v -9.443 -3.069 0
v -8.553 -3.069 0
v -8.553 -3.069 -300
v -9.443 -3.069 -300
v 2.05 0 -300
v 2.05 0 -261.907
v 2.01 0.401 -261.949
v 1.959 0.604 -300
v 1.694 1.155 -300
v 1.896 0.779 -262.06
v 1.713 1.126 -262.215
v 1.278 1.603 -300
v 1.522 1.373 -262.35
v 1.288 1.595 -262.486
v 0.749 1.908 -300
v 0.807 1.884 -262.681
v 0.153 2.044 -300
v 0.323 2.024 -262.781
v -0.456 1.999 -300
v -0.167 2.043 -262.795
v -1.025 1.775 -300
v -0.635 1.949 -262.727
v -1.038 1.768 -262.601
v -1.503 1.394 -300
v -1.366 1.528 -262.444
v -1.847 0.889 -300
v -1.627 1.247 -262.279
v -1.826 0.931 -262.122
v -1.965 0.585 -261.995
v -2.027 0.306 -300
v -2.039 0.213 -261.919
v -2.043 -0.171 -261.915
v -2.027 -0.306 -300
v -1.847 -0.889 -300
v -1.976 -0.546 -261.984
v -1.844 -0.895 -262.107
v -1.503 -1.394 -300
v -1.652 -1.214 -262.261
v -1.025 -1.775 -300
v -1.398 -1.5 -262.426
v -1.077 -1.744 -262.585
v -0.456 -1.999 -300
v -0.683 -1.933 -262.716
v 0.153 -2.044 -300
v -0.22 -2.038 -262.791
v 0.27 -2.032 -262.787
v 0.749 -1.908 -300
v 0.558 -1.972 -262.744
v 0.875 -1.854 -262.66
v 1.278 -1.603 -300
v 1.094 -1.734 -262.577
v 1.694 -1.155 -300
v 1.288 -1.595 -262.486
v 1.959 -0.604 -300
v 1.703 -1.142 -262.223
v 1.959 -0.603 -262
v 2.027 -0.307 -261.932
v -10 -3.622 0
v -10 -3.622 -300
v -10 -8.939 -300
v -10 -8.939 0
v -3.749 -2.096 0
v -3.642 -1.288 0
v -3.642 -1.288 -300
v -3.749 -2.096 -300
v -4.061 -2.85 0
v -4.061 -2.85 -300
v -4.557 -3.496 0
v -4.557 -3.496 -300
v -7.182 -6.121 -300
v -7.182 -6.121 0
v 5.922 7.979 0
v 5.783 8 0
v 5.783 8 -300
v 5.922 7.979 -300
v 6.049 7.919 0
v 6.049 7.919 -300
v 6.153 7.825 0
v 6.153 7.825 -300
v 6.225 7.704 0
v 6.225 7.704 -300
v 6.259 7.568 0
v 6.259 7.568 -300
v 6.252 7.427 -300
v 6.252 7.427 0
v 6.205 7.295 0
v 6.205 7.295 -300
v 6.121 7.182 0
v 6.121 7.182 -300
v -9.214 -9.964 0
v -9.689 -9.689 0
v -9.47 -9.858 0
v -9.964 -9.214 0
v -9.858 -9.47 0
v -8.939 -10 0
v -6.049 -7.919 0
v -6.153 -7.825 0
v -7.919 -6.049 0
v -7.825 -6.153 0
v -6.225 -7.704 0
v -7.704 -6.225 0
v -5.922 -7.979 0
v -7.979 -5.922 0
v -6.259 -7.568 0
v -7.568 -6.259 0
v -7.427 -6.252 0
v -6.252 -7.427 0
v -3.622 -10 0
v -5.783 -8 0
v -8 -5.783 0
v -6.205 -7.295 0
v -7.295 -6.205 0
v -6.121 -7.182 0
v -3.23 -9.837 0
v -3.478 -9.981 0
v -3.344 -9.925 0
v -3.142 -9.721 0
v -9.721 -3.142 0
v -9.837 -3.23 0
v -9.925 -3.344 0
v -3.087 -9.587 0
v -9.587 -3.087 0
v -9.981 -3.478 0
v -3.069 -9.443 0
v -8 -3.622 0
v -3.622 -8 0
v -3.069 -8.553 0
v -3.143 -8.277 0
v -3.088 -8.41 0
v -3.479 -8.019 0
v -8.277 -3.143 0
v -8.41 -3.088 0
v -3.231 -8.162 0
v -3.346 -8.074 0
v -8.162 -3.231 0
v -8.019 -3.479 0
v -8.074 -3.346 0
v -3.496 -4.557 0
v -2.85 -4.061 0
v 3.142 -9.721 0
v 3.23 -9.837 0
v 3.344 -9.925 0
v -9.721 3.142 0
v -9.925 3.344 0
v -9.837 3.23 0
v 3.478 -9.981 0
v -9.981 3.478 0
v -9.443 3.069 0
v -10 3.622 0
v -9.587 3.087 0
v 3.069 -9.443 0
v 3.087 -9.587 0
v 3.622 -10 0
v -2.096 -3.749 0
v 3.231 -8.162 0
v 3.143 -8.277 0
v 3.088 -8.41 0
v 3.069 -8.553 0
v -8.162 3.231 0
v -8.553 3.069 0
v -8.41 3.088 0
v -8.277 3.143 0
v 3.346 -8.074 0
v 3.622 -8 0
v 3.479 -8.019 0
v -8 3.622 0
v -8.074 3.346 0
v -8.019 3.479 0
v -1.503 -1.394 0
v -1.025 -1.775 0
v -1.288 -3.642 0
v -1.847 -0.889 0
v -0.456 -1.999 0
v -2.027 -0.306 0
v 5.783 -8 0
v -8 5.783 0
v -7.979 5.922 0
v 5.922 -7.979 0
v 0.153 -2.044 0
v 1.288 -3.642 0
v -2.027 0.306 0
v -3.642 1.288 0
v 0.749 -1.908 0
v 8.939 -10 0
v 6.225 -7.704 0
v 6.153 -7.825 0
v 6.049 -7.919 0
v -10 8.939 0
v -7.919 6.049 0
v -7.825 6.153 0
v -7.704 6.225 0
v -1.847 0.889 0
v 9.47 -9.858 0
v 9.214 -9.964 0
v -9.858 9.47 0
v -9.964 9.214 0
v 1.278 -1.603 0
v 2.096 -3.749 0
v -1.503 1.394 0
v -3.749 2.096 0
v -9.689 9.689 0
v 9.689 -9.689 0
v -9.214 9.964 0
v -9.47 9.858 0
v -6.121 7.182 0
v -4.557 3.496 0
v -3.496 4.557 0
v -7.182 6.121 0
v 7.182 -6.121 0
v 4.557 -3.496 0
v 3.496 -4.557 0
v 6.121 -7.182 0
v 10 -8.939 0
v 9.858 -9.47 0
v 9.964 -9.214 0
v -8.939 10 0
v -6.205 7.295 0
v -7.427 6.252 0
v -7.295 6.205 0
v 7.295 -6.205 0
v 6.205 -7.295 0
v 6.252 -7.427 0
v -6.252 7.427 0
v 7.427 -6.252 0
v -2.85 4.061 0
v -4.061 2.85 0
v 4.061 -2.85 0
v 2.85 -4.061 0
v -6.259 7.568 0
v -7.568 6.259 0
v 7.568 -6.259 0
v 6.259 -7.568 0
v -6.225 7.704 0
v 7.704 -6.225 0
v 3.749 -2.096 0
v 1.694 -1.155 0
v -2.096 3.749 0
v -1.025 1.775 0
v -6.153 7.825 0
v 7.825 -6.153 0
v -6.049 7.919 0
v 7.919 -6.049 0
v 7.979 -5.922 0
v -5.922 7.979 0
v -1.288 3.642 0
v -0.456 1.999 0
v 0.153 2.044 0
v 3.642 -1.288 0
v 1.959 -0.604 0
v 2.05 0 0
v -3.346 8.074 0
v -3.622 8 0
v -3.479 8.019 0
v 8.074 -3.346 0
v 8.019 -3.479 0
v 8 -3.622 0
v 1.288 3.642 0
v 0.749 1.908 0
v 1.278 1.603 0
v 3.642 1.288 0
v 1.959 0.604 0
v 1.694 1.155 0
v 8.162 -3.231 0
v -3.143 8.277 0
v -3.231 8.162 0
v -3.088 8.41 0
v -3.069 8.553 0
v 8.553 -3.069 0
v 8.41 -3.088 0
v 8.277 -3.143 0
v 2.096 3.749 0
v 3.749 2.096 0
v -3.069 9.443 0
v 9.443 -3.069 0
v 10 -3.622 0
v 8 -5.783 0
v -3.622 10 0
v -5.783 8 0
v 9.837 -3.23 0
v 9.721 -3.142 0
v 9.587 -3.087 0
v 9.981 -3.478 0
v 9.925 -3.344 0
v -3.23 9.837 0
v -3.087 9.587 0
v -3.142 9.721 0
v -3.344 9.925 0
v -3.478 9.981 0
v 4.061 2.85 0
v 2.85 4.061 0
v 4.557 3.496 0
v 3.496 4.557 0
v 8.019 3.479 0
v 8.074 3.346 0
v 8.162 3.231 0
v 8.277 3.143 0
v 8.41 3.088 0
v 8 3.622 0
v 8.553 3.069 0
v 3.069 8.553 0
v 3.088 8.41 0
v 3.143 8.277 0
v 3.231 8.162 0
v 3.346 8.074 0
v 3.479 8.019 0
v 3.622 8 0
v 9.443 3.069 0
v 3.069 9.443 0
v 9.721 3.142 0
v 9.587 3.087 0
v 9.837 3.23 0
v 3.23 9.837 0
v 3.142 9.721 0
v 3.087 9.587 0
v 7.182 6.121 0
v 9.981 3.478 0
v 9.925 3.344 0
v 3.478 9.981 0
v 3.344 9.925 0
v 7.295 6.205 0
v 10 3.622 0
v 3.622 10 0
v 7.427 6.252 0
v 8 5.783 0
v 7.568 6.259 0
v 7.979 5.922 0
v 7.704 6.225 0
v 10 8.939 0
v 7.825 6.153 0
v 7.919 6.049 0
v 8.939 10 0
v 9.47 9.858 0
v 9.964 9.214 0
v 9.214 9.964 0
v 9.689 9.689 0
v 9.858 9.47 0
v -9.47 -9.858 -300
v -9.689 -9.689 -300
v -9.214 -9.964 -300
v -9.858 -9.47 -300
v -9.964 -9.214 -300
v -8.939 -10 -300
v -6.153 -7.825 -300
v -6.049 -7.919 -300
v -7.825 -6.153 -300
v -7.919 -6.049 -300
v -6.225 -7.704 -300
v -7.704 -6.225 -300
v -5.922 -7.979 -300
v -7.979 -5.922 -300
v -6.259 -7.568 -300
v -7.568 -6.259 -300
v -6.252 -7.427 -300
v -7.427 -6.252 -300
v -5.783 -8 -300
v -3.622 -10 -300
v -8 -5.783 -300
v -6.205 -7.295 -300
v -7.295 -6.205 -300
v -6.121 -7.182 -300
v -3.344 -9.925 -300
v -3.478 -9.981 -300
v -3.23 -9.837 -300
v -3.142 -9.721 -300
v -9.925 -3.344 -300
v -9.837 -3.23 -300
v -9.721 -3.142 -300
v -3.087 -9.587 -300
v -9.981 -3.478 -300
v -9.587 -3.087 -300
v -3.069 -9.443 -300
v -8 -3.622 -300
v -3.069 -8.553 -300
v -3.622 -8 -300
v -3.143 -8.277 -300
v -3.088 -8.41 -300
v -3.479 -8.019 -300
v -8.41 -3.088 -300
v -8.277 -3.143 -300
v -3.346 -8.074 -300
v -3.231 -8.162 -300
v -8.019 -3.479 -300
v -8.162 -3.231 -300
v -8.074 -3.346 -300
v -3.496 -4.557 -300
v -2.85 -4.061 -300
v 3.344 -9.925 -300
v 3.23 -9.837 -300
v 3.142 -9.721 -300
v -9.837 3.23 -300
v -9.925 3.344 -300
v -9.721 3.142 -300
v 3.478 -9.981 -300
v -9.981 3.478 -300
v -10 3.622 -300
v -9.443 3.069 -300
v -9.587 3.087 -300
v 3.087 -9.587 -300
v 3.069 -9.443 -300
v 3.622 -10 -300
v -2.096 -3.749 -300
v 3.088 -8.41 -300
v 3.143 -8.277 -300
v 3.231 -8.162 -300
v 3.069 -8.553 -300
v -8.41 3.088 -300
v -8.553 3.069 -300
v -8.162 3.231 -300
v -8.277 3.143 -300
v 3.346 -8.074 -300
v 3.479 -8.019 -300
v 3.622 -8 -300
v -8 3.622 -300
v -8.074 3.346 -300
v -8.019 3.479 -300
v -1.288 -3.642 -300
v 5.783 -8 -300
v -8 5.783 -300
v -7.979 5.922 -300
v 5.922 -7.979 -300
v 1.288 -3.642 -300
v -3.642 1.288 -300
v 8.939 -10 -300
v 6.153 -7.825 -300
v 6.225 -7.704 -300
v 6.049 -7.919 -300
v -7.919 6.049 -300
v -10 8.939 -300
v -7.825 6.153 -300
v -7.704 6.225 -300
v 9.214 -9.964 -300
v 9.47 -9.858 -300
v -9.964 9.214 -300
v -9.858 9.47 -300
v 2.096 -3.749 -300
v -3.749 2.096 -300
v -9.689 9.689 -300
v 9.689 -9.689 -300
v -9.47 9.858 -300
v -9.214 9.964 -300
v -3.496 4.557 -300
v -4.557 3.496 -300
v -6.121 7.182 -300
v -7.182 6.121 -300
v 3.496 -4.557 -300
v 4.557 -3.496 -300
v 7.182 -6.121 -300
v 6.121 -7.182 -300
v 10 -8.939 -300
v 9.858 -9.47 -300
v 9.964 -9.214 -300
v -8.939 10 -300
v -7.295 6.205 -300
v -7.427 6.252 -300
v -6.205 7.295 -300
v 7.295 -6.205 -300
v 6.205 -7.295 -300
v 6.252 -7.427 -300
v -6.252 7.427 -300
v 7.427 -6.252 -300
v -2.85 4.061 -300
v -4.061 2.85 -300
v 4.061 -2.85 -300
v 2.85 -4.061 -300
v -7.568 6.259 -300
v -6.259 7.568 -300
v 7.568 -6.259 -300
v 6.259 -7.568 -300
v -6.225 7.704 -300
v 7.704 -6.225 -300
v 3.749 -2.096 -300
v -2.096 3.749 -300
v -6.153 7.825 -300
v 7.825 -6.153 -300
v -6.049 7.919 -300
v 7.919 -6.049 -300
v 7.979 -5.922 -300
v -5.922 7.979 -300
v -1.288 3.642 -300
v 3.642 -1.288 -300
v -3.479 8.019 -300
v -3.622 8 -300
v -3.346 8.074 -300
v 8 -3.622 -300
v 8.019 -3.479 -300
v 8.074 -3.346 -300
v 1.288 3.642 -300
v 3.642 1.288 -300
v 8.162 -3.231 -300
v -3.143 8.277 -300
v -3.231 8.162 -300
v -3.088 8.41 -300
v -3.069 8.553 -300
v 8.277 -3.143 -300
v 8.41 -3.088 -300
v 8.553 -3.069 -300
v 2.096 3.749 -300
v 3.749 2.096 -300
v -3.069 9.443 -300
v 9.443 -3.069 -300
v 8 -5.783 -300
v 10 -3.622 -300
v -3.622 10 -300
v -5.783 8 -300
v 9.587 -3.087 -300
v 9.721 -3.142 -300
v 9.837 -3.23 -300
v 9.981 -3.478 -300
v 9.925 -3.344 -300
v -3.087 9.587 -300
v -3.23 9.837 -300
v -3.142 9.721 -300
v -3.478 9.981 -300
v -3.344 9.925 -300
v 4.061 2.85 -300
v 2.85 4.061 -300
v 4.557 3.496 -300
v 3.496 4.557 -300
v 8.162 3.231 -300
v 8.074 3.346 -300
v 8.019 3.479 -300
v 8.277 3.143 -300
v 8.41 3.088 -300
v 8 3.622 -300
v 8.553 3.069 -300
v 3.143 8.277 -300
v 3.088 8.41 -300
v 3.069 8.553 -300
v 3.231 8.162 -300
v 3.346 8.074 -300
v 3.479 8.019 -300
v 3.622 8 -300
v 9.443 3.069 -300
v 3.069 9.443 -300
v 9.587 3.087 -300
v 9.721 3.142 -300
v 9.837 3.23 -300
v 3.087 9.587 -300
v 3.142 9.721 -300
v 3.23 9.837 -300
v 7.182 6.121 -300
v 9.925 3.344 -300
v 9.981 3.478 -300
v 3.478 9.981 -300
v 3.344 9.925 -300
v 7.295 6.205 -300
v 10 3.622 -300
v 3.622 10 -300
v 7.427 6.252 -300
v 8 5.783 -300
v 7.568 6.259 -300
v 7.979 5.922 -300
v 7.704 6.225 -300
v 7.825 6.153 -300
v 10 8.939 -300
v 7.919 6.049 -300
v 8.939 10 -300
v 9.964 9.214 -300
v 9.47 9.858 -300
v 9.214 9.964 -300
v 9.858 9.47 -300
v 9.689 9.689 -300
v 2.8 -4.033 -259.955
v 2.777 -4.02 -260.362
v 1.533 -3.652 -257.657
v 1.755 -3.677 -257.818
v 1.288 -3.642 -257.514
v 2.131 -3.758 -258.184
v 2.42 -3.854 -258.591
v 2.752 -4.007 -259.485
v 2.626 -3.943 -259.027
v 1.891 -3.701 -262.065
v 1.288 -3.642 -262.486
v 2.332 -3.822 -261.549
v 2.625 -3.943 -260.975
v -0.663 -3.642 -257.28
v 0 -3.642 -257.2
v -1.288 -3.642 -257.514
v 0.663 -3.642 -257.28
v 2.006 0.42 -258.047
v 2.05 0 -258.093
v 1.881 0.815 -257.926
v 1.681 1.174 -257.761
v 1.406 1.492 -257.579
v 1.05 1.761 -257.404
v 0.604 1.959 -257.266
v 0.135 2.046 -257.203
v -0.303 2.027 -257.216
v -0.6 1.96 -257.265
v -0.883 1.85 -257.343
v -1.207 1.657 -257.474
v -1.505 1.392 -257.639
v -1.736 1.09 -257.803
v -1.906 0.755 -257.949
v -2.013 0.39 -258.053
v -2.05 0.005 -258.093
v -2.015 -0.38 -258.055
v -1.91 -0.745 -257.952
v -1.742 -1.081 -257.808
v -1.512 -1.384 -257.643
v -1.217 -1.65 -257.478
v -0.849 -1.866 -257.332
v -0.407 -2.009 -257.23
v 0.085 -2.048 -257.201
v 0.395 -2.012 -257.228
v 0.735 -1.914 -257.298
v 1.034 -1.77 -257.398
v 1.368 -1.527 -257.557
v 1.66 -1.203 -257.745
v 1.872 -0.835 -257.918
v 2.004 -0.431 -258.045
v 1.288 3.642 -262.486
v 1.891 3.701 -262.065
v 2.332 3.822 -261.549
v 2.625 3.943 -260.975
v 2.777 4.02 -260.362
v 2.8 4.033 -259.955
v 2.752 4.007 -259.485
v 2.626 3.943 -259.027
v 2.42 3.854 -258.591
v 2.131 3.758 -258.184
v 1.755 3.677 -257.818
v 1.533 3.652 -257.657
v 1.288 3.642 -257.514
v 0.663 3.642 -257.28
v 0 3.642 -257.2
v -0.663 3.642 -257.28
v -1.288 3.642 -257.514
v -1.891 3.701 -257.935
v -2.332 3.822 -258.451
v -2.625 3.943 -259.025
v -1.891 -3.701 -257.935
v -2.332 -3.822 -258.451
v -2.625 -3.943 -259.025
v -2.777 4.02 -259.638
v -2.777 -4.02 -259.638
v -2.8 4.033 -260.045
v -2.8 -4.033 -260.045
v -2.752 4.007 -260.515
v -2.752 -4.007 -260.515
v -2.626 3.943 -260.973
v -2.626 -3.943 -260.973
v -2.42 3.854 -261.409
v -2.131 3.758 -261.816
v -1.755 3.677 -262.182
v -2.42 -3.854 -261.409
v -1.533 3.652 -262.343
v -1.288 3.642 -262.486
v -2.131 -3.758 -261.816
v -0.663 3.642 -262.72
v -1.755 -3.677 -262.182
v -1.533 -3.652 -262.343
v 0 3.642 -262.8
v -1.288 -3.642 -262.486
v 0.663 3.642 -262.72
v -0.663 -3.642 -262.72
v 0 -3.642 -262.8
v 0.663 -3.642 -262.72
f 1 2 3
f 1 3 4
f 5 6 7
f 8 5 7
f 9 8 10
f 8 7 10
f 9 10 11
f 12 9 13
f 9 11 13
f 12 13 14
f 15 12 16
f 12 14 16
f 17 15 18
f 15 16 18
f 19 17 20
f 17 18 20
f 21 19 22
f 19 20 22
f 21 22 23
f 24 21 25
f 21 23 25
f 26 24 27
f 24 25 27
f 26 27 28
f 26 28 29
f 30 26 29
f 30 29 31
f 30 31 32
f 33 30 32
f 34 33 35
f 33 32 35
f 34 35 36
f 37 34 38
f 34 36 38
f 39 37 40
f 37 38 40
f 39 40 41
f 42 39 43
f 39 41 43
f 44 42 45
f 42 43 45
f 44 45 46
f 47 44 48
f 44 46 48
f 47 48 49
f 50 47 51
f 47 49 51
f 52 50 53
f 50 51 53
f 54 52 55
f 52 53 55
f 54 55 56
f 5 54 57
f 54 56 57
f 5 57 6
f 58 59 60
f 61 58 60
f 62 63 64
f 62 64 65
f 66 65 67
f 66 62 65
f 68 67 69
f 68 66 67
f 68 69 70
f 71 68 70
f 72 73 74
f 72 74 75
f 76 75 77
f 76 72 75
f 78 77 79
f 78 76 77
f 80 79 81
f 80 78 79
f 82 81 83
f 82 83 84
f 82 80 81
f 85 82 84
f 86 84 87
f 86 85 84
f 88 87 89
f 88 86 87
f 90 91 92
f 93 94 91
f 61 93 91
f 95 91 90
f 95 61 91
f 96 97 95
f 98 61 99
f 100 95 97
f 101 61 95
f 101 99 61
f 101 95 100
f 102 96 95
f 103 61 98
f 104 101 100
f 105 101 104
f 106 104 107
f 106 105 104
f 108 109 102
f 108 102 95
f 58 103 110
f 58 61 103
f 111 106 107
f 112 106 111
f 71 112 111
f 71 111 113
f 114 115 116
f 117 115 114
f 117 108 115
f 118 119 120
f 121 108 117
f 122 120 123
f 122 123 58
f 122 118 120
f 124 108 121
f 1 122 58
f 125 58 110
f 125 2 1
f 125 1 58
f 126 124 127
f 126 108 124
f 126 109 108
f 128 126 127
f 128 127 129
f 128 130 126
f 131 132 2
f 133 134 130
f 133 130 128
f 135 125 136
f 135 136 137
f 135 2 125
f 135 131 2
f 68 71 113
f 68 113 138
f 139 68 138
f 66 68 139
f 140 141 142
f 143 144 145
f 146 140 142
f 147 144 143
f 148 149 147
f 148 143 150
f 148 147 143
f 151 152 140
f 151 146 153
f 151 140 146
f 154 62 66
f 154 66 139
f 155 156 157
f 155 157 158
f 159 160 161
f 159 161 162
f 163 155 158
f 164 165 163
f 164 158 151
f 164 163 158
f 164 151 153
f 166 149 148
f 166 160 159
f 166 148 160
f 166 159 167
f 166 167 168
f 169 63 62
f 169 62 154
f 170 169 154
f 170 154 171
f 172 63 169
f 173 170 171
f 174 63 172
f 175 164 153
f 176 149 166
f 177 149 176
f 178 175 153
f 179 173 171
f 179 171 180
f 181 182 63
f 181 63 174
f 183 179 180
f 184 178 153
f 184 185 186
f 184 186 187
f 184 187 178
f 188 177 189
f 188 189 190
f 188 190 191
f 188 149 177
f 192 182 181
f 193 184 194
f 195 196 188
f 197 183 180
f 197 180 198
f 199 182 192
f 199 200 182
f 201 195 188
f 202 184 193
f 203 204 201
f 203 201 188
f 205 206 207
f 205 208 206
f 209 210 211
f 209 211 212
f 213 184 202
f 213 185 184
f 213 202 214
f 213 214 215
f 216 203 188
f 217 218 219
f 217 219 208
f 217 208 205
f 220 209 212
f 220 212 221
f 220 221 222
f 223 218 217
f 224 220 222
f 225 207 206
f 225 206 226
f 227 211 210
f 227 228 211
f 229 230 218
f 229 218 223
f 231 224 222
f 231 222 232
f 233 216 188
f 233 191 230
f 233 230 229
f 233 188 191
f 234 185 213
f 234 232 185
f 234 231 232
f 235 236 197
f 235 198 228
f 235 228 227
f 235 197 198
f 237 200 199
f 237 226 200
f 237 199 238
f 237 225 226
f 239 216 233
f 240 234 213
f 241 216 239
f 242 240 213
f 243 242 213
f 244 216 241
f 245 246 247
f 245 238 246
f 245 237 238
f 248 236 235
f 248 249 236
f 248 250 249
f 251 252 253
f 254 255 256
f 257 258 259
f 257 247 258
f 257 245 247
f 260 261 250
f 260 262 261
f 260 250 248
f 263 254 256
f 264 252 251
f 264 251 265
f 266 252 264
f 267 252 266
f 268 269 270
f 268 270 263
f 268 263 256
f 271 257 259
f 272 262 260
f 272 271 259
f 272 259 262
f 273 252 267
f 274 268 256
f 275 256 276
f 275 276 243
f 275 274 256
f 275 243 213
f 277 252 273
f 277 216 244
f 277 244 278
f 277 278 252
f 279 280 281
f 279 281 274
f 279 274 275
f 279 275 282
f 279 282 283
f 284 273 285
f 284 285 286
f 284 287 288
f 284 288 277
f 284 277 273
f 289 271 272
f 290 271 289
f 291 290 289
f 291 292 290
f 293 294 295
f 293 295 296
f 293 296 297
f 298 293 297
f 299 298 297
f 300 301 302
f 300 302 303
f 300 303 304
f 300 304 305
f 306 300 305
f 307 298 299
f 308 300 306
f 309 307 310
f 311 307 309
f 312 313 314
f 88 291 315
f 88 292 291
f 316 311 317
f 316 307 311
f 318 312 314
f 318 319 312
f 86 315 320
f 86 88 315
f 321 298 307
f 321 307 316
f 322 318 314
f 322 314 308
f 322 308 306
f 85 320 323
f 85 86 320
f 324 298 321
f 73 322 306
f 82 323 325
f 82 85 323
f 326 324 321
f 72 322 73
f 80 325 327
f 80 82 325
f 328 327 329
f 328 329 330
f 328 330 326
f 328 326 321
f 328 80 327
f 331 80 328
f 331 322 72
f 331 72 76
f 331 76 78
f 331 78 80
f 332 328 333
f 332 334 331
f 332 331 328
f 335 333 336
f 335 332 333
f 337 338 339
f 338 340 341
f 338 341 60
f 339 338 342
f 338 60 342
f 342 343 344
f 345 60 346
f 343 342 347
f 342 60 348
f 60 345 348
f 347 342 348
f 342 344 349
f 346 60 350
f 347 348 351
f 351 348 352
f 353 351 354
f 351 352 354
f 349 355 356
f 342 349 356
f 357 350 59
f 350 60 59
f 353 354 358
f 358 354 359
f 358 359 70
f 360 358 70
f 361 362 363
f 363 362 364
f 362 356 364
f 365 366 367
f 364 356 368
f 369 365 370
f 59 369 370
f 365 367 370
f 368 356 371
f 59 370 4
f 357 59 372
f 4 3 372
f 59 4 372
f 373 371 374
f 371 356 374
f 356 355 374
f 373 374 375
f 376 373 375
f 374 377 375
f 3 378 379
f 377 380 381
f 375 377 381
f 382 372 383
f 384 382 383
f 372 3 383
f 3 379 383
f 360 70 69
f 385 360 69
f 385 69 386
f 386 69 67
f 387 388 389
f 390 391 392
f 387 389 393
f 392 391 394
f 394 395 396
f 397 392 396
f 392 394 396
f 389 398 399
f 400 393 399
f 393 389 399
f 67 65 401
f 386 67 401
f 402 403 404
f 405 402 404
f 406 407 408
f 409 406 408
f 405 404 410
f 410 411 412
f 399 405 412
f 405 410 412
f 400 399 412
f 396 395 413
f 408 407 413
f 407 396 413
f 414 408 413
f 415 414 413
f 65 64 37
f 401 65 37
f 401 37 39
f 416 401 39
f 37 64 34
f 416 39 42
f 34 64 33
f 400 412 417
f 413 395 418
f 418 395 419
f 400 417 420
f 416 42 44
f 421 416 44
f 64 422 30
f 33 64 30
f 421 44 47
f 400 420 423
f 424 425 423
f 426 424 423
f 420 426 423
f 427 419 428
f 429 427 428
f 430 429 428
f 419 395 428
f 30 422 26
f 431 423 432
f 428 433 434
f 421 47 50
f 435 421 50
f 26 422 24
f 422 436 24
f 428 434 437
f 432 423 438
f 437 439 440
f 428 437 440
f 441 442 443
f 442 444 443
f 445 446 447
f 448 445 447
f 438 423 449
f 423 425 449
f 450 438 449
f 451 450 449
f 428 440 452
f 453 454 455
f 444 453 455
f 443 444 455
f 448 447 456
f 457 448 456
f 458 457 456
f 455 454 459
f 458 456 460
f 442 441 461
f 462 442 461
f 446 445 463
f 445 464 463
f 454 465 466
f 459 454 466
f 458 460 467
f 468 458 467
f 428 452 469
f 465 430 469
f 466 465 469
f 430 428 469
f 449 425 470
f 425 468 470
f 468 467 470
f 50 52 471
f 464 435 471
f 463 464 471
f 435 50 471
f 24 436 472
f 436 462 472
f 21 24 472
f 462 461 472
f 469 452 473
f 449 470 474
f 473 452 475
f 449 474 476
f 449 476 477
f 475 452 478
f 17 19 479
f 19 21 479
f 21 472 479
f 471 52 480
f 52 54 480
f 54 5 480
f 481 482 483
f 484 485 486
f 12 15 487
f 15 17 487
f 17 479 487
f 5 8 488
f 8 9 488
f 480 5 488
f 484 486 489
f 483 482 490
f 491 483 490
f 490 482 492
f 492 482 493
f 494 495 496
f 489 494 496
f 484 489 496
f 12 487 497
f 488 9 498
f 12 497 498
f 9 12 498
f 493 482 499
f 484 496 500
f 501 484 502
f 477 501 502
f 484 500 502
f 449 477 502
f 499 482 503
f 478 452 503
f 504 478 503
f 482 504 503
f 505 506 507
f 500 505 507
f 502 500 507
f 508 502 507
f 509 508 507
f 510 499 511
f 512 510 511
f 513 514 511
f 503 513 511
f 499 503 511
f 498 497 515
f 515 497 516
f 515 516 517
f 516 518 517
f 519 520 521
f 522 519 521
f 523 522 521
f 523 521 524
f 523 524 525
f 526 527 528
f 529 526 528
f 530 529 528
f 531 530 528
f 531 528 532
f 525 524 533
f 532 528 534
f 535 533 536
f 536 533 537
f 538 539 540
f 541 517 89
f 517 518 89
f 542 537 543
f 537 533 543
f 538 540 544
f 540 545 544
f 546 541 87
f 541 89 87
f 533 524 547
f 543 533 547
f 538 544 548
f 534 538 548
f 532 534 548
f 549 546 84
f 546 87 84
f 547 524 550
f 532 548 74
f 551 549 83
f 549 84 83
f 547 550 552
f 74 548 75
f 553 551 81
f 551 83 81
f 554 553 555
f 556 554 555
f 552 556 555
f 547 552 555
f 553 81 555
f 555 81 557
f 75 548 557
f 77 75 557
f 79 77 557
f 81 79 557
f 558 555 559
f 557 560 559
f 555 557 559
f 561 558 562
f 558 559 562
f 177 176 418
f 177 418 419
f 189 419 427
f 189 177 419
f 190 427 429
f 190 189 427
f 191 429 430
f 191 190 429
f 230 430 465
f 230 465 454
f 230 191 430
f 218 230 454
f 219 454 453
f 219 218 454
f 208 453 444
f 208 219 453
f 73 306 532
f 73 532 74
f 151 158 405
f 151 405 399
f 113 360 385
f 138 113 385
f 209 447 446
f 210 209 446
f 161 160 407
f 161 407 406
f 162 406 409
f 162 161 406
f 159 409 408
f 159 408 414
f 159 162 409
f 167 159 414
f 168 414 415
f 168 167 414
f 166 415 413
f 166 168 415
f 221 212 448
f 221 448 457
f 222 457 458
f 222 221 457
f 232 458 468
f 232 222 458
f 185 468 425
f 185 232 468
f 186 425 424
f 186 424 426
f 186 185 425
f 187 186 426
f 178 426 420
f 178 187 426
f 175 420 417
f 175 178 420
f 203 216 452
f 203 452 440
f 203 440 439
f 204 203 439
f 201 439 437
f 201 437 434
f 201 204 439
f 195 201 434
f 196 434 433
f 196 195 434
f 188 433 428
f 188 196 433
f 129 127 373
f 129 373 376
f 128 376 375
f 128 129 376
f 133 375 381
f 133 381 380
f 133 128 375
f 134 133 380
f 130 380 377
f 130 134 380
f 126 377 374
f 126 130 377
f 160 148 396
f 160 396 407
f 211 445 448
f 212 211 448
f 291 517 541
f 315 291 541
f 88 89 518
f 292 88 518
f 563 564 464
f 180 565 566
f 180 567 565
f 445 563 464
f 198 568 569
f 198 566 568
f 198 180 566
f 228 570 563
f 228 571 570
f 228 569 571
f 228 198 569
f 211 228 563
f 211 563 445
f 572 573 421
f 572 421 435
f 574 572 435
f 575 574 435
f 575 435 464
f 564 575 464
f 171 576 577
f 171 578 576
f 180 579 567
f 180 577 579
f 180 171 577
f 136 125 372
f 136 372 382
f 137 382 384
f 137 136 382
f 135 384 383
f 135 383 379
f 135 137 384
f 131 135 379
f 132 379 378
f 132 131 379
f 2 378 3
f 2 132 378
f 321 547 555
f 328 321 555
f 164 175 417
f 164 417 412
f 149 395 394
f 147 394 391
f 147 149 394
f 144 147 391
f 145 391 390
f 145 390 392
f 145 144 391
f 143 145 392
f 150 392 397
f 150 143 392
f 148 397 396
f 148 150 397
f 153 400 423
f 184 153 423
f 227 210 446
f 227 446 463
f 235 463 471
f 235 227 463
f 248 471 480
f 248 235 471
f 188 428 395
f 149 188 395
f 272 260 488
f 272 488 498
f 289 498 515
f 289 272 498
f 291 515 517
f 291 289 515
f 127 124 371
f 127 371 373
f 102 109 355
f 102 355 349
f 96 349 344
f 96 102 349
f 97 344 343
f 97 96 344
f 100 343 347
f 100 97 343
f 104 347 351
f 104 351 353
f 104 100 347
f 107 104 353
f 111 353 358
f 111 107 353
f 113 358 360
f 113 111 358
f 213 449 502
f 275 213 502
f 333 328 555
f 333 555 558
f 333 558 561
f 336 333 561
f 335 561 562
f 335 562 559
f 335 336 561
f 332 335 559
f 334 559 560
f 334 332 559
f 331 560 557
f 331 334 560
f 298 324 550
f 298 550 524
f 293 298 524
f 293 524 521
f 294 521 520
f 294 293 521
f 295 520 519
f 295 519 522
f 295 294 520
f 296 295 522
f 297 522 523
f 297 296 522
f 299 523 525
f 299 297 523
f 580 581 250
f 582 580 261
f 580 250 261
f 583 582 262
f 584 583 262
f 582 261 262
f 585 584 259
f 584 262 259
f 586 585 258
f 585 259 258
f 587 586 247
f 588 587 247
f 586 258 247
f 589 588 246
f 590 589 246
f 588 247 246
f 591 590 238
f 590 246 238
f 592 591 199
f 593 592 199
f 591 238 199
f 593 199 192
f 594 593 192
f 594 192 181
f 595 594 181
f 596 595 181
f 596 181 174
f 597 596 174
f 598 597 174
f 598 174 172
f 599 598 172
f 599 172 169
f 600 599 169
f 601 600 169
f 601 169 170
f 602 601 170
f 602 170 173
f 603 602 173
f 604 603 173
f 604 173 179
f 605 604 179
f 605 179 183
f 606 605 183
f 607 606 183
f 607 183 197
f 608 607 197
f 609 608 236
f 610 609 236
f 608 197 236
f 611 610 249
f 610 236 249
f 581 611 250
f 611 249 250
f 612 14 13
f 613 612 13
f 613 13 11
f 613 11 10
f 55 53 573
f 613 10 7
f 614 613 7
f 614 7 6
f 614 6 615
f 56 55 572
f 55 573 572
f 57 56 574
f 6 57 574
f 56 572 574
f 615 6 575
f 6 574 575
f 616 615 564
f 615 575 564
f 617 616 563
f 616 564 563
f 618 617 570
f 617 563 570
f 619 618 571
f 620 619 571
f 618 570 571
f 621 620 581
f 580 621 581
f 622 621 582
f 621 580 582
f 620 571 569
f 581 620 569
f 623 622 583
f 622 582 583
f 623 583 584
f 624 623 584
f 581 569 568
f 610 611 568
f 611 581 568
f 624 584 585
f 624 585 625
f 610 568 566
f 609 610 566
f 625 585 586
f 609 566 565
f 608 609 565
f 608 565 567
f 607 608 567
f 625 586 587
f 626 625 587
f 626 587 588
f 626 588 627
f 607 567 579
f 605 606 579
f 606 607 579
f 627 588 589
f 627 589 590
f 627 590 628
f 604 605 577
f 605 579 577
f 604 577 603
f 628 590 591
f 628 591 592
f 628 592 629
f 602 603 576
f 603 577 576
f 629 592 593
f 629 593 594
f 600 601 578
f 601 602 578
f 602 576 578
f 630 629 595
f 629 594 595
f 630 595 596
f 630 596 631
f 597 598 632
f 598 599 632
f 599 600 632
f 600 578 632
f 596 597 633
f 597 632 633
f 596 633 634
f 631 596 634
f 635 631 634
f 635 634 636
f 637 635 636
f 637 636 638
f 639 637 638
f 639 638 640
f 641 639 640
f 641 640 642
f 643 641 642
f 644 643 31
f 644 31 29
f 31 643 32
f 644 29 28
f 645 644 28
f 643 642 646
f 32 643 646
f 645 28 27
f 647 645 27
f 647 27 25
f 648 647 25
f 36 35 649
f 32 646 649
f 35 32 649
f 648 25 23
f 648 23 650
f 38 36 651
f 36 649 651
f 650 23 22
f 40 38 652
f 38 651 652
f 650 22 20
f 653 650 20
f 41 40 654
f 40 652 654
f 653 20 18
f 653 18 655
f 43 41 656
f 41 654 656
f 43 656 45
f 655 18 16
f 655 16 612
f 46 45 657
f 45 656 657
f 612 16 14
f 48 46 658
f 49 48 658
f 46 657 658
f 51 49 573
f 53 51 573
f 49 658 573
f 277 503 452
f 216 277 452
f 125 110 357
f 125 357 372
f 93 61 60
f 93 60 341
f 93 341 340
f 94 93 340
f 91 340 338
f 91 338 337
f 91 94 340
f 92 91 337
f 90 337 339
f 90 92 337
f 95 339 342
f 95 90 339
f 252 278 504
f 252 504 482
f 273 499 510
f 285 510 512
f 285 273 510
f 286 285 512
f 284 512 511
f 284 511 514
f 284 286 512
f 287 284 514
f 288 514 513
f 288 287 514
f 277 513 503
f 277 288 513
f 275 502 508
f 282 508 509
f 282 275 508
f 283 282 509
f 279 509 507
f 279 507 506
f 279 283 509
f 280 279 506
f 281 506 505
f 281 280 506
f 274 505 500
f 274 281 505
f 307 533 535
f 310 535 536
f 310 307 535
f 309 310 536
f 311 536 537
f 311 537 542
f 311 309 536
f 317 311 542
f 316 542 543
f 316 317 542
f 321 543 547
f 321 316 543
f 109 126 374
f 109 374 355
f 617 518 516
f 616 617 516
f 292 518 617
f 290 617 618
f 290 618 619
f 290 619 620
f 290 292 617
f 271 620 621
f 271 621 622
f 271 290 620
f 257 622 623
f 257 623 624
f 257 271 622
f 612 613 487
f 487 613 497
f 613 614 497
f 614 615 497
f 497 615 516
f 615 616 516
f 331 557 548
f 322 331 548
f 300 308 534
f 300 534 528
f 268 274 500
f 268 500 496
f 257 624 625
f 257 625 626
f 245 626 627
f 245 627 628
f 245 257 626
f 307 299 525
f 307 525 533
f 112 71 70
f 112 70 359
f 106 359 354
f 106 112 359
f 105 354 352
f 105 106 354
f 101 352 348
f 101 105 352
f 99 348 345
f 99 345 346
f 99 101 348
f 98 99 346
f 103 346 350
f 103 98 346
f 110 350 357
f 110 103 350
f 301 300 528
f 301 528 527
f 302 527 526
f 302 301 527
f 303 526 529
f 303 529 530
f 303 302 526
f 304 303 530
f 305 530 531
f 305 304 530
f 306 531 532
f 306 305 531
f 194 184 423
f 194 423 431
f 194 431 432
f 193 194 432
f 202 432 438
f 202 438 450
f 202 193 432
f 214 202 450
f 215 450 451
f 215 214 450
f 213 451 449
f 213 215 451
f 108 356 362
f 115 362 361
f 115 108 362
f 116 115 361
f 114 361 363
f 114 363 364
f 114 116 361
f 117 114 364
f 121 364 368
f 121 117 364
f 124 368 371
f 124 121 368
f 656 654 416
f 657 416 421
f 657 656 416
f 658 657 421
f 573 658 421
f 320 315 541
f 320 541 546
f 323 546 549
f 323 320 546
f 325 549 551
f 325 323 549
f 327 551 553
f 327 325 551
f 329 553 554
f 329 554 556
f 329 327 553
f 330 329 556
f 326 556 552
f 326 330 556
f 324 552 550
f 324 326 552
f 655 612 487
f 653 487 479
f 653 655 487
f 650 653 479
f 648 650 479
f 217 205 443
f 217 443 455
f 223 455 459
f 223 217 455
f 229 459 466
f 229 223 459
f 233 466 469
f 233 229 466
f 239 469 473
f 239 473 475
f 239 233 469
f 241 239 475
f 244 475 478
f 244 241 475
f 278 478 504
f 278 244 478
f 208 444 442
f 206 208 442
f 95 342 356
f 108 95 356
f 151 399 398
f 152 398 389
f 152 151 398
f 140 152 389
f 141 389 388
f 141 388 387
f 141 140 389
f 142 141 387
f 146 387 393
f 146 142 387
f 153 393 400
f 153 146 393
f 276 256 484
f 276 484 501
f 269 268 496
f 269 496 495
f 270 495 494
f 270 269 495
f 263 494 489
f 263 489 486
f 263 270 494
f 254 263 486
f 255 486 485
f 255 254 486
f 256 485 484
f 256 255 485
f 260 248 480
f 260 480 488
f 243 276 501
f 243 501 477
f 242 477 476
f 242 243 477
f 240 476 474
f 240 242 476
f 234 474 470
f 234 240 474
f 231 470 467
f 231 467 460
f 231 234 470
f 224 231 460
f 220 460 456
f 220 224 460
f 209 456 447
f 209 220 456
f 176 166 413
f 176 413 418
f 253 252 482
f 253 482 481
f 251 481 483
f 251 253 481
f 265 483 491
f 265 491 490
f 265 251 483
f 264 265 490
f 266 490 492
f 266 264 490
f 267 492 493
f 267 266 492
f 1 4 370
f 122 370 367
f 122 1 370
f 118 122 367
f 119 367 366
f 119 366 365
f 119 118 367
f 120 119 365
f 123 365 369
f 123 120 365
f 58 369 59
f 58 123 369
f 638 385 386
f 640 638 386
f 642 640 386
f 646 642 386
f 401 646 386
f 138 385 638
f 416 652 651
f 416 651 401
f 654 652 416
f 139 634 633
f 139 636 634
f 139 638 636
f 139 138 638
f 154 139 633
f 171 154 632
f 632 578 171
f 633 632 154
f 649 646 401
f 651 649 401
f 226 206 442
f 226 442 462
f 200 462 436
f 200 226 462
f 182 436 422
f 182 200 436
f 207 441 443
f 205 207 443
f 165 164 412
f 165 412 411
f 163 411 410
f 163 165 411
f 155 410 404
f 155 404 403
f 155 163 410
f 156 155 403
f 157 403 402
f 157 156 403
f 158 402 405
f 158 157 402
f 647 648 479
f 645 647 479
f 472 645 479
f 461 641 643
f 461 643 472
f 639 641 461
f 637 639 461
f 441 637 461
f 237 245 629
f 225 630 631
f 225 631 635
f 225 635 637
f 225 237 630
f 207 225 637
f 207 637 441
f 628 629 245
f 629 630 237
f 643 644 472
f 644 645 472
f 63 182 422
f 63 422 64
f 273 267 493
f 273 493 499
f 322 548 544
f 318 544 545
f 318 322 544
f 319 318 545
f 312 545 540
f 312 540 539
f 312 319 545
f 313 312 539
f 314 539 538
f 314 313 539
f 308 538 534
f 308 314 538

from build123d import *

# Parameters (mm, degrees)
SKETCH2_R           = 2.05
BOSS_EXTRUDE1_DEPTH = 300
SKETCH4_R           = 2.8
CUT_EXTRUDE1_DEPTH  = 43


with BuildPart() as part:
    # Sketch2 → Boss-Extrude1 (new body)
    with BuildSketch(Plane.XY):
        with BuildLine():
            Line((-3.642230561, 1.287773026), (-3.642230561, -1.287773026))
            ThreePointArc((-3.642230561, -1.287773026), (-3.87999308, -2.483085929), (-4.55708345, -3.496423279))
            Line((-4.55708345, -3.496423279), (-7.182004606, -6.121344434))
            ThreePointArc((-7.182004606, -6.121344434), (-7.704200045, -6.225215565), (-8, -5.782519648))
            Line((-8, -5.782519648), (-8, -3.622007668))
            ThreePointArc((-8, -3.622007668), (-8.161974206, -3.230967343), (-8.553014531, -3.068993137))
            Line((-8.553014531, -3.068993137), (-9.443284204, -3.068993137))
            ThreePointArc((-9.443284204, -3.068993137), (-9.836715763, -3.229656566), (-10, -3.622007668))
            Line((-10, -3.622007668), (-10, -8.939033256))
            ThreePointArc((-10, -8.939033256), (-9.689250035, -9.689250035), (-8.939033256, -10))
            Line((-8.939033256, -10), (-3.622007668, -10))
            ThreePointArc((-3.622007668, -10), (-3.229656566, -9.836715763), (-3.068993137, -9.443284204))
            Line((-3.068993137, -9.443284204), (-3.068993137, -8.553014531))
            ThreePointArc((-3.068993137, -8.553014531), (-3.230967343, -8.161974206), (-3.622007668, -8))
            Line((-3.622007668, -8), (-5.782519648, -8))
            ThreePointArc((-5.782519648, -8), (-6.225215565, -7.704200045), (-6.121344434, -7.182004606))
            Line((-6.121344434, -7.182004606), (-3.496423279, -4.55708345))
            ThreePointArc((-3.496423279, -4.55708345), (-2.483085929, -3.87999308), (-1.287773026, -3.642230561))
            Line((-1.287773026, -3.642230561), (1.287773026, -3.642230561))
            ThreePointArc((1.287773026, -3.642230561), (2.483085929, -3.87999308), (3.496423279, -4.55708345))
            Line((3.496423279, -4.55708345), (6.121344434, -7.182004606))
            ThreePointArc((6.121344434, -7.182004606), (6.225215565, -7.704200045), (5.782519648, -8))
            Line((5.782519648, -8), (3.622007668, -8))
            ThreePointArc((3.622007668, -8), (3.230967343, -8.161974206), (3.068993137, -8.553014531))
            Line((3.068993137, -8.553014531), (3.068993137, -9.443284204))
            ThreePointArc((3.068993137, -9.443284204), (3.229656566, -9.836715763), (3.622007668, -10))
            Line((3.622007668, -10), (8.939033256, -10))
            ThreePointArc((8.939033256, -10), (9.689250035, -9.689250035), (10, -8.939033256))
            Line((10, -8.939033256), (10, -3.622007668))
            ThreePointArc((10, -3.622007668), (9.836715763, -3.229656566), (9.443284204, -3.068993137))
            Line((9.443284204, -3.068993137), (8.553014531, -3.068993137))
            ThreePointArc((8.553014531, -3.068993137), (8.161974206, -3.230967343), (8, -3.622007668))
            Line((8, -3.622007668), (8, -5.782519648))
            ThreePointArc((8, -5.782519648), (7.704200045, -6.225215565), (7.182004606, -6.121344434))
            Line((7.182004606, -6.121344434), (4.55708345, -3.496423279))
            ThreePointArc((4.55708345, -3.496423279), (3.87999308, -2.483085929), (3.642230561, -1.287773026))
            Line((3.642230561, -1.287773026), (3.642230561, 1.287773026))
            ThreePointArc((3.642230561, 1.287773026), (3.87999308, 2.483085929), (4.55708345, 3.496423279))
            Line((4.55708345, 3.496423279), (7.182004606, 6.121344434))
            ThreePointArc((7.182004606, 6.121344434), (7.704200045, 6.225215565), (8, 5.782519648))
            Line((8, 5.782519648), (8, 3.622007668))
            ThreePointArc((8, 3.622007668), (8.161974206, 3.230967343), (8.553014531, 3.068993137))
            Line((8.553014531, 3.068993137), (9.443284204, 3.068993137))
            ThreePointArc((9.443284204, 3.068993137), (9.836715763, 3.229656566), (10, 3.622007668))
            Line((10, 3.622007668), (10, 8.939033256))
            ThreePointArc((10, 8.939033256), (9.689250035, 9.689250035), (8.939033256, 10))
            Line((8.939033256, 10), (3.622007668, 10))
            ThreePointArc((3.622007668, 10), (3.229656566, 9.836715763), (3.068993137, 9.443284204))
            Line((3.068993137, 9.443284204), (3.068993137, 8.553014531))
            ThreePointArc((3.068993137, 8.553014531), (3.230967343, 8.161974206), (3.622007668, 8))
            Line((3.622007668, 8), (5.782519648, 8))
            ThreePointArc((5.782519648, 8), (6.225215565, 7.704200045), (6.121344434, 7.182004606))
            Line((6.121344434, 7.182004606), (3.496423279, 4.55708345))
            ThreePointArc((3.496423279, 4.55708345), (2.483085929, 3.87999308), (1.287773026, 3.642230561))
            Line((1.287773026, 3.642230561), (-1.287773026, 3.642230561))
            ThreePointArc((-1.287773026, 3.642230561), (-2.483085929, 3.87999308), (-3.496423279, 4.55708345))
            Line((-3.496423279, 4.55708345), (-6.121344434, 7.182004606))
            ThreePointArc((-6.121344434, 7.182004606), (-6.225215565, 7.704200045), (-5.782519648, 8))
            Line((-5.782519648, 8), (-3.622007668, 8))
            ThreePointArc((-3.622007668, 8), (-3.230967343, 8.161974206), (-3.068993137, 8.553014531))
            Line((-3.068993137, 8.553014531), (-3.068993137, 9.443284204))
            ThreePointArc((-3.068993137, 9.443284204), (-3.229656566, 9.836715763), (-3.622007668, 10))
            Line((-3.622007668, 10), (-8.939033256, 10))
            ThreePointArc((-8.939033256, 10), (-9.689250035, 9.689250035), (-10, 8.939033256))
            Line((-10, 8.939033256), (-10, 3.622007668))
            ThreePointArc((-10, 3.622007668), (-9.836715763, 3.229656566), (-9.443284204, 3.068993137))
            Line((-9.443284204, 3.068993137), (-8.553014531, 3.068993137))
            ThreePointArc((-8.553014531, 3.068993137), (-8.161974206, 3.230967343), (-8, 3.622007668))
            Line((-8, 3.622007668), (-8, 5.782519648))
            ThreePointArc((-8, 5.782519648), (-7.704200045, 6.225215565), (-7.182004606, 6.121344434))
            Line((-7.182004606, 6.121344434), (-4.55708345, 3.496423279))
            ThreePointArc((-4.55708345, 3.496423279), (-3.87999308, 2.483085929), (-3.642230561, 1.287773026))
        make_face()
        Circle(SKETCH2_R, mode=Mode.SUBTRACT)
    extrude(amount=-BOSS_EXTRUDE1_DEPTH)

    # Sketch4 → Cut-Extrude1 (cut)
    with BuildSketch(Plane.XZ.offset(10)):
        with Locations(Location((0, -260, 0), (0, 0, 297.381876825))):
            Circle(SKETCH4_R)
    extrude(amount=-CUT_EXTRUDE1_DEPTH, mode=Mode.SUBTRACT)


solid = part.part
